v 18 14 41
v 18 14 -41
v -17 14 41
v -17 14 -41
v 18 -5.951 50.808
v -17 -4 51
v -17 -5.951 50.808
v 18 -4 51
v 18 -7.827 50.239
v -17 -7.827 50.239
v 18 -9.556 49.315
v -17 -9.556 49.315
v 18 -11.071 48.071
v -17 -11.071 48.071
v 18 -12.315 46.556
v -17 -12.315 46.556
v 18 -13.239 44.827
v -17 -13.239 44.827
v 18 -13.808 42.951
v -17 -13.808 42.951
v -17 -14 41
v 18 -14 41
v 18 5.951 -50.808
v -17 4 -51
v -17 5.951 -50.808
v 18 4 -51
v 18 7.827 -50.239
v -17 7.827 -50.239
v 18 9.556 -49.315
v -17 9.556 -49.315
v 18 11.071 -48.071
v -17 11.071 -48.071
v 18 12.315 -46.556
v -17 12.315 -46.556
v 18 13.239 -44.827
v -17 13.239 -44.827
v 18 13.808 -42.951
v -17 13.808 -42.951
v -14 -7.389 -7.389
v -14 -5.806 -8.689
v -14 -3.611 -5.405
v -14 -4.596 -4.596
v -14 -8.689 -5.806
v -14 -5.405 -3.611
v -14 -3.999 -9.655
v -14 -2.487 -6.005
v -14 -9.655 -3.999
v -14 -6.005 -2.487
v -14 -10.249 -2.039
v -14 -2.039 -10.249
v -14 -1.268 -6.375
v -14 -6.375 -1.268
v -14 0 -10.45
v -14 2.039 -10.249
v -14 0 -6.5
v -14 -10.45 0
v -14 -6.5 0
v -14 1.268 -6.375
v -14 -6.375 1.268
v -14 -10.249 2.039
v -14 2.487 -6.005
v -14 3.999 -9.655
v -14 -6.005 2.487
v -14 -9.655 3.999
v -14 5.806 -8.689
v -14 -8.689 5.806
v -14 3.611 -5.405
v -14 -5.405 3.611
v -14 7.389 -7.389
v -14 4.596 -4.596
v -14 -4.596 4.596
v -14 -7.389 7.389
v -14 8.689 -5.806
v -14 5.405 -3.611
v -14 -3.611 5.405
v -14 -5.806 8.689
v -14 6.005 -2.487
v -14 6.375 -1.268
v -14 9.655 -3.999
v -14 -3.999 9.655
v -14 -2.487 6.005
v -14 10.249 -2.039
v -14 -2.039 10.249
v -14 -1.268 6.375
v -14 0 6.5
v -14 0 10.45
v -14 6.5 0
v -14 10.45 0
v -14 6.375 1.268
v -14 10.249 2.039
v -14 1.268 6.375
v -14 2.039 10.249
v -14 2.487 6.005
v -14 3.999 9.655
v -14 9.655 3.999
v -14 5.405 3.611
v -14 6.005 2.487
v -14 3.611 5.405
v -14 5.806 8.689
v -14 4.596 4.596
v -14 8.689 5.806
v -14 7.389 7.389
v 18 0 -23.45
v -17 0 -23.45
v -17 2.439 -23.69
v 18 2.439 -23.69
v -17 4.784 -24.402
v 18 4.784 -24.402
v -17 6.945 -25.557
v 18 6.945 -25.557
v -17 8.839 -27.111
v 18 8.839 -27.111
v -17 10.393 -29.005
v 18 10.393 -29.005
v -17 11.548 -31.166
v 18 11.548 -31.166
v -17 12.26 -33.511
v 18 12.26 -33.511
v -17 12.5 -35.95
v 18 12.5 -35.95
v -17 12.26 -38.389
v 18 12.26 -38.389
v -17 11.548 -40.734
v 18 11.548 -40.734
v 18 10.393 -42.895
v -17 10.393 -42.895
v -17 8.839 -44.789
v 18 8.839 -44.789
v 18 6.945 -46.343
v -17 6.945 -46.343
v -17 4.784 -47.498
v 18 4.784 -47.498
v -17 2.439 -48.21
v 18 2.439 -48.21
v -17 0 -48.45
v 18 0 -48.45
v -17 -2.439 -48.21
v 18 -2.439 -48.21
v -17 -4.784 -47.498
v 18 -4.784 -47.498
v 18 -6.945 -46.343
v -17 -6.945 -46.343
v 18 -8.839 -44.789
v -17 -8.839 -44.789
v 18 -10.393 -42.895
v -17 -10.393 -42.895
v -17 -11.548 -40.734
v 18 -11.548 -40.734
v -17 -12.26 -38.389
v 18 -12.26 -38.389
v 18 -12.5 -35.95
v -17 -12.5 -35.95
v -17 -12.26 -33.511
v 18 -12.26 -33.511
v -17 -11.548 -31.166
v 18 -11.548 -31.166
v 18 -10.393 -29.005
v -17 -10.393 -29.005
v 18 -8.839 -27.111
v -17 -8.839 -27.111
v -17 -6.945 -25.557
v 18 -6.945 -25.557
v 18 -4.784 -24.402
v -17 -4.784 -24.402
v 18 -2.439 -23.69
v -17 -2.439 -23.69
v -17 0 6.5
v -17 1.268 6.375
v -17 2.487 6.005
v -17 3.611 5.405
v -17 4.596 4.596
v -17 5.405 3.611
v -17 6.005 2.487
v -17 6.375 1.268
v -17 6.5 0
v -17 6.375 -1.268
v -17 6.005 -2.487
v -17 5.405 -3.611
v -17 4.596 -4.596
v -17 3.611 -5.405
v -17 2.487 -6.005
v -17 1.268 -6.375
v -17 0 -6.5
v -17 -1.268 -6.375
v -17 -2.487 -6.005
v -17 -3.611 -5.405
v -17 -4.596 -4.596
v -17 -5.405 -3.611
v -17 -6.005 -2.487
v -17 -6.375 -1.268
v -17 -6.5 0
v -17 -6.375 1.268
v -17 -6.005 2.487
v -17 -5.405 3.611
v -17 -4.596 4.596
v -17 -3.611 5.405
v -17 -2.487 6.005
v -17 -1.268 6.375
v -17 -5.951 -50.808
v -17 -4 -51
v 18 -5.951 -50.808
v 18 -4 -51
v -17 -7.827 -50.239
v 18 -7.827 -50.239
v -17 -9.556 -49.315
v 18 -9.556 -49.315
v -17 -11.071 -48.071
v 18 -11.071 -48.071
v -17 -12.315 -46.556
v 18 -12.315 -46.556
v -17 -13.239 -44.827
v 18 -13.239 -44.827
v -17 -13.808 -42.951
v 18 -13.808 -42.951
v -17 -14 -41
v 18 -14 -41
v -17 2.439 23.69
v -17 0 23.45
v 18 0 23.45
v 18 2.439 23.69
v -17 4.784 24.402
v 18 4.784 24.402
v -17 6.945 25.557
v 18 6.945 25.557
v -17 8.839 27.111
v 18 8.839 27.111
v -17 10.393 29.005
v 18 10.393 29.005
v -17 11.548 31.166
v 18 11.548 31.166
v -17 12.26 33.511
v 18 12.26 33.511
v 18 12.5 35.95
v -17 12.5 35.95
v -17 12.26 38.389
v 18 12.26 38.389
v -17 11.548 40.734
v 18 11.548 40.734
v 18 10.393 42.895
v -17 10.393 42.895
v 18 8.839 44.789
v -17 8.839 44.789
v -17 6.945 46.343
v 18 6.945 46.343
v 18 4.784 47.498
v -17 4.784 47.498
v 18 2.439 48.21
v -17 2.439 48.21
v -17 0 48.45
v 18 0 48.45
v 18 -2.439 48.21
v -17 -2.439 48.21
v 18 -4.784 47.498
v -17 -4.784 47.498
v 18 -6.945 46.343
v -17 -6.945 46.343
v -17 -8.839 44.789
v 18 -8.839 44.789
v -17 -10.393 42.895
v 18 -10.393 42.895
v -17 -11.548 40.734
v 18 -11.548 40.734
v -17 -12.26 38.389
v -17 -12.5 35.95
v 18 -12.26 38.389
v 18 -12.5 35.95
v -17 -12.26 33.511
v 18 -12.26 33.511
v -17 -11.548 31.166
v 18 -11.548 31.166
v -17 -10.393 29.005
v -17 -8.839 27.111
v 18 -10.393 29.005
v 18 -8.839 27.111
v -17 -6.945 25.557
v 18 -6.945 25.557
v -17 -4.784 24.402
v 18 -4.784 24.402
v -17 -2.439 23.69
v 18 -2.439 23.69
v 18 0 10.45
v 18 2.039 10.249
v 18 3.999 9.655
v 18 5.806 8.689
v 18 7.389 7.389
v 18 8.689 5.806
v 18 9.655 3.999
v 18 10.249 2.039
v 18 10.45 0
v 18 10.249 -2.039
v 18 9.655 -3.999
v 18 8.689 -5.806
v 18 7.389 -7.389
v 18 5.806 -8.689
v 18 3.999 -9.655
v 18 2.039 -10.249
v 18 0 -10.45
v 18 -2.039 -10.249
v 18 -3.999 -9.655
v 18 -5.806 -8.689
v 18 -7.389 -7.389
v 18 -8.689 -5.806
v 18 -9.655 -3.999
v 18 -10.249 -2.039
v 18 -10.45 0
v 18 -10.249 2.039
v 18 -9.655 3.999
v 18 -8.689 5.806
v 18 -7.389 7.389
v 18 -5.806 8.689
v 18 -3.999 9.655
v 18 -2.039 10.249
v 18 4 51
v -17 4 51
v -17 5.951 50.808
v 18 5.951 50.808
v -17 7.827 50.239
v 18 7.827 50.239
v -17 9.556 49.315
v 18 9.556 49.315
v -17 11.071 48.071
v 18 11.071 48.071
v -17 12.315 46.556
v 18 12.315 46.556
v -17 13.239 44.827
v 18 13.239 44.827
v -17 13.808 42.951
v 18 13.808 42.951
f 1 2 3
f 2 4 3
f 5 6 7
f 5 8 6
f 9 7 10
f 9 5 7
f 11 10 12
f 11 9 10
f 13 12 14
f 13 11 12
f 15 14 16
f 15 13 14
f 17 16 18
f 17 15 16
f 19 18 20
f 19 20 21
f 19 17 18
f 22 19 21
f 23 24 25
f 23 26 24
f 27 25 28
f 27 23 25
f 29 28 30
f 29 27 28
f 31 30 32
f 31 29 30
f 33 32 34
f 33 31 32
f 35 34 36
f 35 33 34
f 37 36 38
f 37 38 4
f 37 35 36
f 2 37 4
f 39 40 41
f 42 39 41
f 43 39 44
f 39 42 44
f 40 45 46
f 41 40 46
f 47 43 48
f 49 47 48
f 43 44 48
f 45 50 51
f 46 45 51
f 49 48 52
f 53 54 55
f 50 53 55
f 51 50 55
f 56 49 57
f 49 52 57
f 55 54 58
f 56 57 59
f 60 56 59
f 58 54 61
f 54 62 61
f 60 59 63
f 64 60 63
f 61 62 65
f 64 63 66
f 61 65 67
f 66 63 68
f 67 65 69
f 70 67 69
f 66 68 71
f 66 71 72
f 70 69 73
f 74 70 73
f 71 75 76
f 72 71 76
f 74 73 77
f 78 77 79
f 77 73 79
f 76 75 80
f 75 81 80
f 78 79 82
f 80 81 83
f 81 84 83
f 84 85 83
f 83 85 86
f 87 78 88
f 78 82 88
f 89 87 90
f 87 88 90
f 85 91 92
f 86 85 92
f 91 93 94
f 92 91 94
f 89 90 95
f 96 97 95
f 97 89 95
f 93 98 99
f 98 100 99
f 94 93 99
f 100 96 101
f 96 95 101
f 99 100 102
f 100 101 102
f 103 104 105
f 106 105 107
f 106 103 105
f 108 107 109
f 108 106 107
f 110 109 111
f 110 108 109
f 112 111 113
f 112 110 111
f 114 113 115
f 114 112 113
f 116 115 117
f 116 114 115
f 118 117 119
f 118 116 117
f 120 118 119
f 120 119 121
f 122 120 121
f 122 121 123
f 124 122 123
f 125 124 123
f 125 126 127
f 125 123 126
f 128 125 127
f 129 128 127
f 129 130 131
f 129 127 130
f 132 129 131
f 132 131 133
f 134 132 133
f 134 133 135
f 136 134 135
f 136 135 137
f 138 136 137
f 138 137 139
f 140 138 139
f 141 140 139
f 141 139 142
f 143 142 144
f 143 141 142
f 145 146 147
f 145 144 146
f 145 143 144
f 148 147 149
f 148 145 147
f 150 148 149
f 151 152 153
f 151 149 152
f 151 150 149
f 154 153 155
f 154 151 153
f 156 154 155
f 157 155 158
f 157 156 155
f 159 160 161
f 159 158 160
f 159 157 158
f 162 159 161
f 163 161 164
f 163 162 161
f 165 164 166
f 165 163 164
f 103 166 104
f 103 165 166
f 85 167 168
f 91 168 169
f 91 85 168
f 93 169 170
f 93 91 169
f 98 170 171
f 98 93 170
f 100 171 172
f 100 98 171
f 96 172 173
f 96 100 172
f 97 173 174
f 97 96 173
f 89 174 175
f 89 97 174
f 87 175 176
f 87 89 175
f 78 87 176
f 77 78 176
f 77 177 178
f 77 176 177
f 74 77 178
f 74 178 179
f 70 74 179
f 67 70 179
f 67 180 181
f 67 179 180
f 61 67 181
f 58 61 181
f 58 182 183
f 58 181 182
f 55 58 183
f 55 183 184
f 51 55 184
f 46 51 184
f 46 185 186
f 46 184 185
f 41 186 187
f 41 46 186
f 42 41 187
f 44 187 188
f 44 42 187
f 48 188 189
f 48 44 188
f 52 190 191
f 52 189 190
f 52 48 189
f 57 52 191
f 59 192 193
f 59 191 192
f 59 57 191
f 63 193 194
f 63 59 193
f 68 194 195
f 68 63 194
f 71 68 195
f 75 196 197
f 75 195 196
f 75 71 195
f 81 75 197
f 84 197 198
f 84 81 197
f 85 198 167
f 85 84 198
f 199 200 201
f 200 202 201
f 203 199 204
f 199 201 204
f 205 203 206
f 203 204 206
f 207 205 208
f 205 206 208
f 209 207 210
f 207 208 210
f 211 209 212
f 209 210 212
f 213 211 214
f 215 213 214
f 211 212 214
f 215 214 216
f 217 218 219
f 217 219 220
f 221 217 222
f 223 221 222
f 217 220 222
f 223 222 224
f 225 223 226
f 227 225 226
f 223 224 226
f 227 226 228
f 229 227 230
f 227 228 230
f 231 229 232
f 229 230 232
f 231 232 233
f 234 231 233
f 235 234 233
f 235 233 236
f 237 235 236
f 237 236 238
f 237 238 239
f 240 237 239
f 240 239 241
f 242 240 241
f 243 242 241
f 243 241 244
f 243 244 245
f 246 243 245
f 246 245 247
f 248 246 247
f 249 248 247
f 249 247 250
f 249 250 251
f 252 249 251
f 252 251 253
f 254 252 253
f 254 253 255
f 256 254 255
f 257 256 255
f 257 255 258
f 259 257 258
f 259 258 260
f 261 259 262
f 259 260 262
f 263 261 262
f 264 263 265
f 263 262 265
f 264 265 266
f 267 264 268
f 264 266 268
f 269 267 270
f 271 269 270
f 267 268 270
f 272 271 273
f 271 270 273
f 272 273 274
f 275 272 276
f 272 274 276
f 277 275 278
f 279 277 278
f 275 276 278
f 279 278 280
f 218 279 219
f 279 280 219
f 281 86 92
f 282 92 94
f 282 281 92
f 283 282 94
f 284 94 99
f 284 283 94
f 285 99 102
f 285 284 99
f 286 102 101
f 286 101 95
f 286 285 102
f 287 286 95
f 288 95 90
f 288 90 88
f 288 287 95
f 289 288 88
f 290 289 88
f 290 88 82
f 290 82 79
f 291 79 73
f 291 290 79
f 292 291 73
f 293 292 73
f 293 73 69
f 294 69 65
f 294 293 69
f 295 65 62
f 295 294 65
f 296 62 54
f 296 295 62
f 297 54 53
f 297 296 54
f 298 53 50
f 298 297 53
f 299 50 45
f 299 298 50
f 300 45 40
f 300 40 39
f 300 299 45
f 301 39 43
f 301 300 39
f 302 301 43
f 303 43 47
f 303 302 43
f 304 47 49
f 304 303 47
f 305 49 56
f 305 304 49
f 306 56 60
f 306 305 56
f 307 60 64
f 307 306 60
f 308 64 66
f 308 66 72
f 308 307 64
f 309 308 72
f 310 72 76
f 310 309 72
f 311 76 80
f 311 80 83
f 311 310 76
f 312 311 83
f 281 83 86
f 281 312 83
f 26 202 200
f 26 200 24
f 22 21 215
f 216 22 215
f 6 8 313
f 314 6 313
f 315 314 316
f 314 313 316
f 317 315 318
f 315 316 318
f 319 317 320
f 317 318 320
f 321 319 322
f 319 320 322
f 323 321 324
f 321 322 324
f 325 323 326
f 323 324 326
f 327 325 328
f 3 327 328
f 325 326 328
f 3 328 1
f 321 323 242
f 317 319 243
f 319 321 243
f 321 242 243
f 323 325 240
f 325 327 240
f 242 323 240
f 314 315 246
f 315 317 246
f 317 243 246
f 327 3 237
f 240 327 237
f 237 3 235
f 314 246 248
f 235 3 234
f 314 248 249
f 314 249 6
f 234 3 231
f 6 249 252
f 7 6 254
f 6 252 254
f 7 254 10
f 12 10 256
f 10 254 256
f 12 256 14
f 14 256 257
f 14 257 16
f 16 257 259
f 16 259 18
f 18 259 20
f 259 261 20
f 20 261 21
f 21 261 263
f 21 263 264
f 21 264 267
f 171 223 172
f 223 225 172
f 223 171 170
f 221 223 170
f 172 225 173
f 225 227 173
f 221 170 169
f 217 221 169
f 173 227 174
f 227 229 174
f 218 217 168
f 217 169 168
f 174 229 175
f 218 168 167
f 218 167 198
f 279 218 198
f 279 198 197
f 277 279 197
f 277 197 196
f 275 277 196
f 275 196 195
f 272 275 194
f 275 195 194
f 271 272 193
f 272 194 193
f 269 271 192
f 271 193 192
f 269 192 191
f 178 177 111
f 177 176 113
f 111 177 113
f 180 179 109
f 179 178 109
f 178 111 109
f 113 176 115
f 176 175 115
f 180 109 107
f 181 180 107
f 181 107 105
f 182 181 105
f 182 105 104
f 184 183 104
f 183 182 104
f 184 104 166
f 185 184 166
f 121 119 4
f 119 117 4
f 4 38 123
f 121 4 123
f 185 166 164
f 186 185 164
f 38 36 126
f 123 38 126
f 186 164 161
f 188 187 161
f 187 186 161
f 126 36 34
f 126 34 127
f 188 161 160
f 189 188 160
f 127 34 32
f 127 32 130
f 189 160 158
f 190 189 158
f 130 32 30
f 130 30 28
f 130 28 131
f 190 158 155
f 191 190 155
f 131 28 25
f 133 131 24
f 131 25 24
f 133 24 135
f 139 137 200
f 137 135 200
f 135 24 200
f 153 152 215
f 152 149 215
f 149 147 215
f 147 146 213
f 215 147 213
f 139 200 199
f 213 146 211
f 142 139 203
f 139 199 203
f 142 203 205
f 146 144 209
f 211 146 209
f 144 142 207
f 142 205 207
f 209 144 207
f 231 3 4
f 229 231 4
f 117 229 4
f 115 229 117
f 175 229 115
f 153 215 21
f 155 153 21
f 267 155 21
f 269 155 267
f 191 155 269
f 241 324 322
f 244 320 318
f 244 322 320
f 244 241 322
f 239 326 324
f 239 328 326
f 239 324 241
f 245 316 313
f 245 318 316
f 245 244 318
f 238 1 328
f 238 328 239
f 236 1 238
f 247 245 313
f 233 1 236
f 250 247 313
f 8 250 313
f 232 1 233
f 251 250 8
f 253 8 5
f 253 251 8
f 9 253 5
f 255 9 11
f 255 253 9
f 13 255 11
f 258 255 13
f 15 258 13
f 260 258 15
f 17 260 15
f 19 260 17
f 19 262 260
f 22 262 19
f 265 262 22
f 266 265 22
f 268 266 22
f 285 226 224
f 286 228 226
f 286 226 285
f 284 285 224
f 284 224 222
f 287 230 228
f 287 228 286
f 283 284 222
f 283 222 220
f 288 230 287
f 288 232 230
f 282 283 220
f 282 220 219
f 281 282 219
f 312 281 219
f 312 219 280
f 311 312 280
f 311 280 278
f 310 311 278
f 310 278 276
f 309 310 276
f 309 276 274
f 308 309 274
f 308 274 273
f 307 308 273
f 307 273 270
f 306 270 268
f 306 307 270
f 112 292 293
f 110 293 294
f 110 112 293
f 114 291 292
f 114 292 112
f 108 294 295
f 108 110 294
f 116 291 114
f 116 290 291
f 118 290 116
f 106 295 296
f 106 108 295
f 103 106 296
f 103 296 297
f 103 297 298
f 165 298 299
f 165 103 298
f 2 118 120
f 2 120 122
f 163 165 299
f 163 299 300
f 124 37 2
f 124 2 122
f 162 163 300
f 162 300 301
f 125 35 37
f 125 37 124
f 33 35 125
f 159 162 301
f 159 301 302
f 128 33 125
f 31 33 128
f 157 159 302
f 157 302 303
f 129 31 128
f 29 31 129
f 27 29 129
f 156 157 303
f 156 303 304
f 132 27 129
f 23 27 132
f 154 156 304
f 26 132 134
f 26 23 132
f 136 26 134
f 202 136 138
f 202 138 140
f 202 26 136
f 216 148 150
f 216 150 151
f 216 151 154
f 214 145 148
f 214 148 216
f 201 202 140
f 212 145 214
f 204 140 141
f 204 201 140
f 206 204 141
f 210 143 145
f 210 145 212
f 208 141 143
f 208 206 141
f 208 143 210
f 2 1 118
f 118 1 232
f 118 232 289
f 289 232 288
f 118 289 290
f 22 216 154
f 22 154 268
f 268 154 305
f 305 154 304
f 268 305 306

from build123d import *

# Parameters (mm, degrees)
BOSS_EXTRUDE1_START  = -17
BOSS_EXTRUDE1_DEPTH  = 35
SKETCH2_R            = 10.45
CUT_EXTRUDE1_DEPTH   = 32
SKETCH3_R            = 6.5
CUT_EXTRUDE2_DEPTH   = 62.814237842
SKETCH4_R            = 12.5
CUT_EXTRUDE3_DEPTH   = 64.419239983
FILLET5_R            = 10
FILLET6_R            = 10
FILLET5_OF_MIRROR1_R = 10
FILLET6_OF_MIRROR1_R = 10


with BuildPart() as part:
    # Sketch1 → Boss-Extrude1 (new body)
    with BuildSketch(Plane.YZ.offset(BOSS_EXTRUDE1_START)):
        with BuildLine():
            Line((-14, 0), (-14, 51))
            Line((-14, 51), (14, 51))
            Line((14, 51), (14, 0))
            ThreePointArc((14, 0), (0, -14), (-14, 0))
        make_face()
    boss_extrude1 = extrude(amount=BOSS_EXTRUDE1_DEPTH)

    # Sketch2 → Cut-Extrude1 (cut)
    with BuildSketch(Plane.YZ.offset(18)):
        with Locations(Location((0, 0, 0), (0, 0, 270))):
            Circle(SKETCH2_R)
    cut_extrude1 = extrude(amount=-CUT_EXTRUDE1_DEPTH, mode=Mode.SUBTRACT)

    # Sketch3 → Cut-Extrude2 (cut, through all)
    with BuildSketch(Plane.YZ.offset(-14)):
        with Locations(Location((0, 0, 0), (0, 0, 270))):
            Circle(SKETCH3_R)
    cut_extrude2 = extrude(amount=-CUT_EXTRUDE2_DEPTH, mode=Mode.SUBTRACT)

    # Sketch4 → Cut-Extrude3 (cut, through all)
    with BuildSketch(Plane.YZ.offset(18)):
        with Locations(Location((0, 35.95, 0), (0, 0, 270))):
            Circle(SKETCH4_R)
    cut_extrude3 = extrude(amount=-CUT_EXTRUDE3_DEPTH, mode=Mode.SUBTRACT)

    # Fillet5
    fillet5_edges = [part.edges().sort_by_distance(p)[0] for p in [
        (0.5, 14, 51),
    ]]
    fillet(fillet5_edges, radius=FILLET5_R)

    # Fillet6
    fillet6_edges = [part.edges().sort_by_distance(p)[0] for p in [
        (0.5, -14, 51),
    ]]
    fillet(fillet6_edges, radius=FILLET6_R)

    # Mirror1: Boss-Extrude1, Cut-Extrude1, Cut-Extrude2, Cut-Extrude3 across plane
    add(boss_extrude1.mirror(Plane.XY))
    add(cut_extrude1.mirror(Plane.XY), mode=Mode.SUBTRACT)
    add(cut_extrude2.mirror(Plane.XY), mode=Mode.SUBTRACT)
    add(cut_extrude3.mirror(Plane.XY), mode=Mode.SUBTRACT)

    # Fillet5 of Mirror1
    fillet5_of_mirror1_edges = [part.edges().sort_by_distance(p)[0] for p in [
        (0.5, 14, -51),
    ]]
    fillet(fillet5_of_mirror1_edges, radius=FILLET5_OF_MIRROR1_R)

    # Fillet6 of Mirror1
    fillet6_of_mirror1_edges = [part.edges().sort_by_distance(p)[0] for p in [
        (0.5, -14, -51),
    ]]
    fillet(fillet6_of_mirror1_edges, radius=FILLET6_OF_MIRROR1_R)


solid = part.part
